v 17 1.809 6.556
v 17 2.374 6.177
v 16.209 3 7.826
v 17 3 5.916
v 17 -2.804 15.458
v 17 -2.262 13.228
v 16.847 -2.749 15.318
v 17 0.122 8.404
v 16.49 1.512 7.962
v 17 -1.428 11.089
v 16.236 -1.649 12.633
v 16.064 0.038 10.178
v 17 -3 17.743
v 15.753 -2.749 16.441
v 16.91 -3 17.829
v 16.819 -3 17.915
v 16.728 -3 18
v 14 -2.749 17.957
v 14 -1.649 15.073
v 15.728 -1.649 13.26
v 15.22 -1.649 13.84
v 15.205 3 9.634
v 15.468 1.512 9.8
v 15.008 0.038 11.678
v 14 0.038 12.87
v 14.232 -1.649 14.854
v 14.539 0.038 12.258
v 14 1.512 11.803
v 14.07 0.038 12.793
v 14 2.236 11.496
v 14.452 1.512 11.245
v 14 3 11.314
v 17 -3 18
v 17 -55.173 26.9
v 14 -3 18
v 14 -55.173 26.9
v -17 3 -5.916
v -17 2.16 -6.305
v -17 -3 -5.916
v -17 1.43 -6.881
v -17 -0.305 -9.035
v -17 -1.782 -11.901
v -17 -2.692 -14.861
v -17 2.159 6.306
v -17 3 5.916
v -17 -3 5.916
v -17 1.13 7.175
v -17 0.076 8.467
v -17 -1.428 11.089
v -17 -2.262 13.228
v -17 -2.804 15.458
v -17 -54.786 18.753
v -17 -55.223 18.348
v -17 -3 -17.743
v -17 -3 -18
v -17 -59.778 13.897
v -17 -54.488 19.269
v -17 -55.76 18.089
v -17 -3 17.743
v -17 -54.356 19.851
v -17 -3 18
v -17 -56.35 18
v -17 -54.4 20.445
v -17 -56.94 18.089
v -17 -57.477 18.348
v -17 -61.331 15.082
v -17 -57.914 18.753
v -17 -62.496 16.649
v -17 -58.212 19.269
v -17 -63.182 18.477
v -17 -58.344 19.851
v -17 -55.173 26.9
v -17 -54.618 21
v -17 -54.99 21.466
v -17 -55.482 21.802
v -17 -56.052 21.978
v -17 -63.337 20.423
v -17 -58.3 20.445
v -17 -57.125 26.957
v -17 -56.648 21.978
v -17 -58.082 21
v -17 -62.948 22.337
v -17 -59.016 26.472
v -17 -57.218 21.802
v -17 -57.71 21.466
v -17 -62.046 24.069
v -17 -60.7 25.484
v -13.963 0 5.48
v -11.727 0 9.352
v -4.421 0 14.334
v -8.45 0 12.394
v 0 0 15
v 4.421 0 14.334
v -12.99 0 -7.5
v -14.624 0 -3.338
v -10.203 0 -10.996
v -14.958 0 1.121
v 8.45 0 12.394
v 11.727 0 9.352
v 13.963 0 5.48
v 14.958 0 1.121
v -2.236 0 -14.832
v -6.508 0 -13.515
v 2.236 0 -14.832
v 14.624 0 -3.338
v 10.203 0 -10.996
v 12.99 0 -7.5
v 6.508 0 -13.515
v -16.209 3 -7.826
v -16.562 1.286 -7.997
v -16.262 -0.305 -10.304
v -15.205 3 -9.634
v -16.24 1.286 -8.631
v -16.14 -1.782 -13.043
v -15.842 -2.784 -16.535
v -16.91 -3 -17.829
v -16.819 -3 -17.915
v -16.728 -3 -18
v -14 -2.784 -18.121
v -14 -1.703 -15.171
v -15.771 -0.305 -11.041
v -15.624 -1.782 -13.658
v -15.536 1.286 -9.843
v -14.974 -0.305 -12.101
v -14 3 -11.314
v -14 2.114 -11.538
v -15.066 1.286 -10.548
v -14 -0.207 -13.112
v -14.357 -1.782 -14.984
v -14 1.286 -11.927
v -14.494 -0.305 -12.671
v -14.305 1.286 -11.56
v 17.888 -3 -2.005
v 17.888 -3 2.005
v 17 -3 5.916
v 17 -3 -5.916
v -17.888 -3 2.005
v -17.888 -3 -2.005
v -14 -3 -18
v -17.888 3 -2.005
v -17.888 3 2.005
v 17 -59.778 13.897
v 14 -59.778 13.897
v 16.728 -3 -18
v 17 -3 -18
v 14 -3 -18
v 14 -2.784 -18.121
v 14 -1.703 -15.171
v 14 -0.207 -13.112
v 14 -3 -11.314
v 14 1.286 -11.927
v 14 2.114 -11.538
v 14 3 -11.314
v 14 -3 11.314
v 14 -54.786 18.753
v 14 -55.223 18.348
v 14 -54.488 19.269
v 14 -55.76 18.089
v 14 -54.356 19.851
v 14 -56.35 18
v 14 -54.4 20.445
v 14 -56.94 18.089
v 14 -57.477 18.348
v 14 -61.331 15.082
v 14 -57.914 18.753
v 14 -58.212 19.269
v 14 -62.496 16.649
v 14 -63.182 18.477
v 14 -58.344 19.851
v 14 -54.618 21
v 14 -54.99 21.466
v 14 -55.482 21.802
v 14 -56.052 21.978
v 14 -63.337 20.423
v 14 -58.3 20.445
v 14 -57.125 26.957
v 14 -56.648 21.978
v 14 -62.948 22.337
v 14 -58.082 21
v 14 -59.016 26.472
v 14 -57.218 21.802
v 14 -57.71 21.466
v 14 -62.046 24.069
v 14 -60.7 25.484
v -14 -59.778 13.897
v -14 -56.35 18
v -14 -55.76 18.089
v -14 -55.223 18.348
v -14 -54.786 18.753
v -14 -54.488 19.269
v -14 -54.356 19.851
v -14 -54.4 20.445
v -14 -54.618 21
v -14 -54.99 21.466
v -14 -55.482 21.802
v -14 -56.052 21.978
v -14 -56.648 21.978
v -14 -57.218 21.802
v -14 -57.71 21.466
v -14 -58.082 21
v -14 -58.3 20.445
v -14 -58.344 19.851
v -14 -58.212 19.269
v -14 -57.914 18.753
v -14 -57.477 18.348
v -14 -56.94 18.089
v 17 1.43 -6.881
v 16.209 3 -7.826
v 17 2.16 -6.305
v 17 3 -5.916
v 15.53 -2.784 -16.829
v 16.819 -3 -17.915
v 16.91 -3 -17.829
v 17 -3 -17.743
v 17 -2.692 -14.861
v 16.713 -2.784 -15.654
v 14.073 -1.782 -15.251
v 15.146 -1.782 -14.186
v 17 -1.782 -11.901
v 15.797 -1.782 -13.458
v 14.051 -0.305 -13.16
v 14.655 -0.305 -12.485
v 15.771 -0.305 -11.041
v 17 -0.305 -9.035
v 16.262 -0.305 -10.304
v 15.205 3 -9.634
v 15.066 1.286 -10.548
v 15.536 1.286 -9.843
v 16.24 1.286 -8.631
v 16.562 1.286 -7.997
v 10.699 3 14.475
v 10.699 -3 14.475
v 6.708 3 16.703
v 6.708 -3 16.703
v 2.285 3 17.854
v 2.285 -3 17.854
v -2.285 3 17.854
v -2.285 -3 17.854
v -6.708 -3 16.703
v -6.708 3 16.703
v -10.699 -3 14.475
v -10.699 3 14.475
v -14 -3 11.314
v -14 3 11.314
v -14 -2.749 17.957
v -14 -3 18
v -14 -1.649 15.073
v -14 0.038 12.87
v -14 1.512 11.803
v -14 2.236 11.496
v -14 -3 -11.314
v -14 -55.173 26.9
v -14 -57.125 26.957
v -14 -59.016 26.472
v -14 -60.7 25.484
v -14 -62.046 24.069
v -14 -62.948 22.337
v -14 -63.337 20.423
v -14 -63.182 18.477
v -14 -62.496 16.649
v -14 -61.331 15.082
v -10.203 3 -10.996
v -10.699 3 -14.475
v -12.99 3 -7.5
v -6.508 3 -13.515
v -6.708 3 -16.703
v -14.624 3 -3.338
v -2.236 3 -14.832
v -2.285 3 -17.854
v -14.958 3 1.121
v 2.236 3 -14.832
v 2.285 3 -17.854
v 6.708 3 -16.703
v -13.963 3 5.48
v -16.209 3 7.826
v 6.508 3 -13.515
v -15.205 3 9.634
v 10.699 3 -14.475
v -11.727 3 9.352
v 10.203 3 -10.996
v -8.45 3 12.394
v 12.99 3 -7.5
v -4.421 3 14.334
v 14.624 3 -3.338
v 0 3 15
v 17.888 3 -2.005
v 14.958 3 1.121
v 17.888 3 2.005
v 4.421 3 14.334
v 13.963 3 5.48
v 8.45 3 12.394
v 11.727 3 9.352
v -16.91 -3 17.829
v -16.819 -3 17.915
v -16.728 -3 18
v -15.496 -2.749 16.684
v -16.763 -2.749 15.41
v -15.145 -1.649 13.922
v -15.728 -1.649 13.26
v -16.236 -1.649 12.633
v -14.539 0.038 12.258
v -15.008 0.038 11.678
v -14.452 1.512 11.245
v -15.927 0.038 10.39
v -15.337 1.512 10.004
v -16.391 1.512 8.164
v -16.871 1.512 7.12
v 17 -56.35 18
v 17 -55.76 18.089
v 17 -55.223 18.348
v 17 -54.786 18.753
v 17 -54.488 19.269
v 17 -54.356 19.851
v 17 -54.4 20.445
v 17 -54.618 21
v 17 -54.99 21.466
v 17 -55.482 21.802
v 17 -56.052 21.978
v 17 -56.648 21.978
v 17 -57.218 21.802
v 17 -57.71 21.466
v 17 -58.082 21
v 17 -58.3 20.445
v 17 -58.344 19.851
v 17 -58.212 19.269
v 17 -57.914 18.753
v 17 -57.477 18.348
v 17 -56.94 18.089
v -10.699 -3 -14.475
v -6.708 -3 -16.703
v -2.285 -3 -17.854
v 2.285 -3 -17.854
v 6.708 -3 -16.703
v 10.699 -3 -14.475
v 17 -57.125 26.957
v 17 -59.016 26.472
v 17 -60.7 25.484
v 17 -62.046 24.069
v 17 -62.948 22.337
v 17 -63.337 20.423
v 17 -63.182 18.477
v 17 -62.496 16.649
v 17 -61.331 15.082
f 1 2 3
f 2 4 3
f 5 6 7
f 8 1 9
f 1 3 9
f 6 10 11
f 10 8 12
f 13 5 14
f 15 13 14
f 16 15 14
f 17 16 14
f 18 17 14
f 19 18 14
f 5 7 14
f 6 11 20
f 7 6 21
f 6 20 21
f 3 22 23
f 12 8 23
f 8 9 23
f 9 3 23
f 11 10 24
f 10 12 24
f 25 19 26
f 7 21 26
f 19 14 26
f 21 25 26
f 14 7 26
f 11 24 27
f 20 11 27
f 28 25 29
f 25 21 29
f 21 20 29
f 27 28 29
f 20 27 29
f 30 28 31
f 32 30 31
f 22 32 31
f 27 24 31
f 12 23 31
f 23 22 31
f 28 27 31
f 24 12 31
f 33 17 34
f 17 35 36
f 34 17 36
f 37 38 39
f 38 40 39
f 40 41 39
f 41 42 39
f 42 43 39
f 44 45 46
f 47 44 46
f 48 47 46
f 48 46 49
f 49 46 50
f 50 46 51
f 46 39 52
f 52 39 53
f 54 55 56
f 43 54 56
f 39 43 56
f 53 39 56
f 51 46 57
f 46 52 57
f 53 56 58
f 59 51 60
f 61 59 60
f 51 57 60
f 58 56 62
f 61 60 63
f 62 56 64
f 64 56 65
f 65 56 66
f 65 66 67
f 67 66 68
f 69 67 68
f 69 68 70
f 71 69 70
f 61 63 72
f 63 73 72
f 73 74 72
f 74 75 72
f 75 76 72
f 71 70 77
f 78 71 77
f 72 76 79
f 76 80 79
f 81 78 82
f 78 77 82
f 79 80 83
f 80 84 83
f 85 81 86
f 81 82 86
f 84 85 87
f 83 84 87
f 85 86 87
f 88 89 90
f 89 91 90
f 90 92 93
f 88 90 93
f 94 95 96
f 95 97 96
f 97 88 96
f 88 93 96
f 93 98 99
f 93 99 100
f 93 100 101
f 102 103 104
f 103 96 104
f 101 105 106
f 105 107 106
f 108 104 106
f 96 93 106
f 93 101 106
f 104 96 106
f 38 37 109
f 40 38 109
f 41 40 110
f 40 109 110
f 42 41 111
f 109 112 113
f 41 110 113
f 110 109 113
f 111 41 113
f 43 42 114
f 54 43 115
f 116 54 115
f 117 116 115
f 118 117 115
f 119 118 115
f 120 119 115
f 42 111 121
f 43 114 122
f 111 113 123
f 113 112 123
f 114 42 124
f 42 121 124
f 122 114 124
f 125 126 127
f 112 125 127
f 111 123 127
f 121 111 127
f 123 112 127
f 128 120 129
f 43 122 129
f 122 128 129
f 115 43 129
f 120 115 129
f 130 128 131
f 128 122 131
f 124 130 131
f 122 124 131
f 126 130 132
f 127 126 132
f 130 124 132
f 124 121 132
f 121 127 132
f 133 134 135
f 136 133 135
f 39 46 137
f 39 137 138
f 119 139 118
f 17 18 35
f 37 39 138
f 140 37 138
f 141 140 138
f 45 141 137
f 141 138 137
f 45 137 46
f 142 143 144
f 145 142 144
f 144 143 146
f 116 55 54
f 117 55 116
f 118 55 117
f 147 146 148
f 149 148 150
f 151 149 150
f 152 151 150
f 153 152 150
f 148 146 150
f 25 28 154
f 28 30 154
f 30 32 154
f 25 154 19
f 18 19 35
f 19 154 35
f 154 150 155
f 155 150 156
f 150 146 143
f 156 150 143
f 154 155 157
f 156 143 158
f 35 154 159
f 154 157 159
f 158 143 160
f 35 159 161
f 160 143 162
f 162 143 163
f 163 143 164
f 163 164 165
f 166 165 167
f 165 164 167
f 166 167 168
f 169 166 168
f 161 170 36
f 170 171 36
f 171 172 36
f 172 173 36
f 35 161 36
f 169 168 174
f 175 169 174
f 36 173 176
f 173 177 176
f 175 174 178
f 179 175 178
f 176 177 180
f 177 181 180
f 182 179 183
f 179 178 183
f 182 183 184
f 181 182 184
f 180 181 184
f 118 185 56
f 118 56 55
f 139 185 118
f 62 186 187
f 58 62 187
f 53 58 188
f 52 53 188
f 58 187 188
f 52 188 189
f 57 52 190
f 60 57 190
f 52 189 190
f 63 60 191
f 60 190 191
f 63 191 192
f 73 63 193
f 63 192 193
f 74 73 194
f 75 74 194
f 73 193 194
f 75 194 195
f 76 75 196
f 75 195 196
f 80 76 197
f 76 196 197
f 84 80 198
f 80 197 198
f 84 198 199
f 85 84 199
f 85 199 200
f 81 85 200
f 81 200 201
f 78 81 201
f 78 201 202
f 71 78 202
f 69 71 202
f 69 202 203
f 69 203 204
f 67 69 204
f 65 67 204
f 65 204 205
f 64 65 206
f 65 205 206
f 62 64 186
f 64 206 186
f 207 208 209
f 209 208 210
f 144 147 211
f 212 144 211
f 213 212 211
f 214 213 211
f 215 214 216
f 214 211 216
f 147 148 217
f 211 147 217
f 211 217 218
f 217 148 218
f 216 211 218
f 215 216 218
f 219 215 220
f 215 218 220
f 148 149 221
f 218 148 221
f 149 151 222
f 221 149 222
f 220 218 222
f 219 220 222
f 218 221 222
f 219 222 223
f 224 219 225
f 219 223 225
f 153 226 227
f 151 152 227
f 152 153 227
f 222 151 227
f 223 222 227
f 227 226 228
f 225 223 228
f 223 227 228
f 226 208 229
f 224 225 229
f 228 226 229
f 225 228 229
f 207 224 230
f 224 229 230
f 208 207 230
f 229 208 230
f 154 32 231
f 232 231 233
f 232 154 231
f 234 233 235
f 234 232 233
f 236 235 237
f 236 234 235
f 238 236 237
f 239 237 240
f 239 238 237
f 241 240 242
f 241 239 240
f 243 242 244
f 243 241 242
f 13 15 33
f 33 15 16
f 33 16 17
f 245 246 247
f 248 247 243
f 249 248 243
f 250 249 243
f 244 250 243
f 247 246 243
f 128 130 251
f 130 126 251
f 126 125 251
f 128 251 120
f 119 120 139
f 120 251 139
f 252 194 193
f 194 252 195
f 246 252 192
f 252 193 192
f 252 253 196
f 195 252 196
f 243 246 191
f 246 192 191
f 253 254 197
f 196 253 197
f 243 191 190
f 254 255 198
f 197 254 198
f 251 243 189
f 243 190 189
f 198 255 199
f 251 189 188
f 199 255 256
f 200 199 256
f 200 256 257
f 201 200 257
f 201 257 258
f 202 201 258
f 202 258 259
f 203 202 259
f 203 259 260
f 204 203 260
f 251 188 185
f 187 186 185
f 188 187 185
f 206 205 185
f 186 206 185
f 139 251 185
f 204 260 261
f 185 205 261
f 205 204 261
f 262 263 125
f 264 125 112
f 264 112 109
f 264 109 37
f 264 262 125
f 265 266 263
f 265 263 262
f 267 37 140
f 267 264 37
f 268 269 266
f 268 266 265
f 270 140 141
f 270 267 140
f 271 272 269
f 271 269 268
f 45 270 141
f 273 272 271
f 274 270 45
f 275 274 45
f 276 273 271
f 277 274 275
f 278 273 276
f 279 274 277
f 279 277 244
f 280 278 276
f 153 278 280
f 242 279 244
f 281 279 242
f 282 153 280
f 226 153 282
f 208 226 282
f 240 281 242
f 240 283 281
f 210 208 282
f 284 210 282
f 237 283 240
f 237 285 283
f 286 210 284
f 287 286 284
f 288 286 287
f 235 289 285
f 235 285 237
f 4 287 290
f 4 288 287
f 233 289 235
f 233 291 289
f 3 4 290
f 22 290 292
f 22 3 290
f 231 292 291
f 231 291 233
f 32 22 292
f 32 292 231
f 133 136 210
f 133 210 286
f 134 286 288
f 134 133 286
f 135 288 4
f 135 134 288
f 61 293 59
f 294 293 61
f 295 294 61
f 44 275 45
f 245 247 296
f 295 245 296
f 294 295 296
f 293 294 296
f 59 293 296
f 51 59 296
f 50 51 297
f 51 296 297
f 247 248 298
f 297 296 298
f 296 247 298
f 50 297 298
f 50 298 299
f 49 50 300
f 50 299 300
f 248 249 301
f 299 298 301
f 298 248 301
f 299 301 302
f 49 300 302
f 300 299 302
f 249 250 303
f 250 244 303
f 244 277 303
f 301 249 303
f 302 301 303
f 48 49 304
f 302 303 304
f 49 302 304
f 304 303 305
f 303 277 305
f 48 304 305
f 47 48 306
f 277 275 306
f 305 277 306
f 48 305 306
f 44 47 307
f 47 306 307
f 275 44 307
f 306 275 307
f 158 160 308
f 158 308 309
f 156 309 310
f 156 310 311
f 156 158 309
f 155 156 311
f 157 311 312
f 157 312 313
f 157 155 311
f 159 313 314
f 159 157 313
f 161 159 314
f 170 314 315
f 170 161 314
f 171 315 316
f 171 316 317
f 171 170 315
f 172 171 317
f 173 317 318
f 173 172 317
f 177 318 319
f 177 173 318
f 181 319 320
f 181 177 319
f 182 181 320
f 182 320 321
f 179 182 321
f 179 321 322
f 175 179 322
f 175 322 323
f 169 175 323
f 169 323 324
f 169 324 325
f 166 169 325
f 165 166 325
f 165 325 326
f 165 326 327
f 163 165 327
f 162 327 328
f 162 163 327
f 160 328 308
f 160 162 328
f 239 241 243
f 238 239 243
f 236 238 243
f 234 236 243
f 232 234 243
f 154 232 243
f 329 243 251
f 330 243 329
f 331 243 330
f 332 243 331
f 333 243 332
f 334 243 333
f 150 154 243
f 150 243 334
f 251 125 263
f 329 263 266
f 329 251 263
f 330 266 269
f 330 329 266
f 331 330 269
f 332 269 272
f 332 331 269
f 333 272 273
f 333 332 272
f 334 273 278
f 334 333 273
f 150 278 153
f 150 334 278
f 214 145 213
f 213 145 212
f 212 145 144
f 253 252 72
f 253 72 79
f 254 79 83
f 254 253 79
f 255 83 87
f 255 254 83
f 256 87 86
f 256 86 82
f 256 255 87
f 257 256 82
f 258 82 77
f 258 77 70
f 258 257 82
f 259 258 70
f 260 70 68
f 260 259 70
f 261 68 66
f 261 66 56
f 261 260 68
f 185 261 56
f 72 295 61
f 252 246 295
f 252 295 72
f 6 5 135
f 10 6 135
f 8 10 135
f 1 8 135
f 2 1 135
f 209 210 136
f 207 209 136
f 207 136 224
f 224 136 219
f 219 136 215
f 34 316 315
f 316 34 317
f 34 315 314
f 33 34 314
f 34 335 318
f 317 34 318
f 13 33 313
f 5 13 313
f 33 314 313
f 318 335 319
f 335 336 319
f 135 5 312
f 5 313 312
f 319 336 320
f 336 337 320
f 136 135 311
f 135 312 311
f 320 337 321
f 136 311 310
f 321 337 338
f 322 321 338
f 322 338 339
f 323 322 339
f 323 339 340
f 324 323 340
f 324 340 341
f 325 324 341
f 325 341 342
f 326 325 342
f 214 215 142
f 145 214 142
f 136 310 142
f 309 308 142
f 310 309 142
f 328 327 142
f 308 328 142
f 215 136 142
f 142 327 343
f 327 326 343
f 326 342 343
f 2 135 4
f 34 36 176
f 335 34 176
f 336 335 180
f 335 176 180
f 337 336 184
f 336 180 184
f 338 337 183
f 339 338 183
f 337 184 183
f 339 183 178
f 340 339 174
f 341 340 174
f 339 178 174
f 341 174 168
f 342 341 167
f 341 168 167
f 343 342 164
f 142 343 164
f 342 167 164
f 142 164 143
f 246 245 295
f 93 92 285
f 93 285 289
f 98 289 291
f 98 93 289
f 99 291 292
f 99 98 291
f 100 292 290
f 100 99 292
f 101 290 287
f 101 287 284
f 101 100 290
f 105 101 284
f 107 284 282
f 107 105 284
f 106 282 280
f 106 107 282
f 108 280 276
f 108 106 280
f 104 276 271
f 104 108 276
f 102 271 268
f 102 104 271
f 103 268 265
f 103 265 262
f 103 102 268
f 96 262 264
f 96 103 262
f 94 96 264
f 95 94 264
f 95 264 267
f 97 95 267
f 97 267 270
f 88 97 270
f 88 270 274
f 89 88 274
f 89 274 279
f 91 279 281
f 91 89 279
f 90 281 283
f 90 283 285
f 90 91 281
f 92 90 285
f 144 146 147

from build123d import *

# Parameters (mm, degrees)
ESQUISSE1_R        = 18
ESQUISSE1_R_2      = 15
BOSS_EXTRU_1_DEPTH = 3
BOSS_EXTRU_3_START = 3
ESQUISSE3_R        = 18
BOSS_EXTRU_3_DEPTH = 3
BOSS_EXTRU_2_START = 14
ESQUISSE2_R        = 2
BOSS_EXTRU_2_DEPTH = 3
FILLET1_R          = 6.6


with BuildPart() as part:
    # Esquisse1 → Boss.-Extru.1 (new body)
    with BuildSketch(Plane(origin=(0, 0, 0), x_dir=(1, 0, 0), z_dir=(0, 1, 0))):
        with Locations(Location((0, 0, 0), (0, 0, 270))):
            Circle(ESQUISSE1_R)
        with Locations(Location((0, 0, 0), (0, 0, 270))):
            Circle(ESQUISSE1_R_2, mode=Mode.SUBTRACT)
    extrude(amount=BOSS_EXTRU_1_DEPTH)

    # Esquisse3 → Boss.-Extru.3 (add)
    with BuildSketch(Plane.XZ.offset(BOSS_EXTRU_3_START)):
        with Locations(Location((0, 0, 0), (0, 0, 270))):
            Circle(ESQUISSE3_R)
    extrude(amount=-BOSS_EXTRU_3_DEPTH)

    # Esquisse2 → Boss.-Extru.2 (add)
    with BuildSketch(Plane(origin=(0, 0, 0), x_dir=(0, 0, -1), z_dir=(1, 0, 0)).offset(BOSS_EXTRU_2_START)):
        with BuildLine():
            Line((-18, -3), (-26.900313921, -55.172856085))
            ThreePointArc((-26.900313921, -55.172856085), (-22.337080841, -62.94833715), (-13.89709797, -59.778496291))
            Line((-13.89709797, -59.778496291), (18, -3))
            Line((18, -3), (-18, -3))
        make_face()
        with Locations((-20, -56.35)):
            Circle(ESQUISSE2_R, mode=Mode.SUBTRACT)
    boss_extru_2 = extrude(amount=BOSS_EXTRU_2_DEPTH)

    # Symétrie1: Boss.-Extru.2 across plane
    add(boss_extru_2.mirror(Plane(origin=(0, 0, 0), x_dir=(0, 0, 1), z_dir=(1, 0, 0))))

    # Fillet1
    # the kernel refuses this fillet: 6.6 mm, written as the material it adds along each edge
    with BuildSketch(Plane(origin=(0, -3, 0), x_dir=(-0.8375611584299304, 0, 0.5463435786110358), z_dir=(0.5463435786110358, 0, 0.8375611584299304))) as fillet1_piece_1_section:
        with BuildLine():
            CenterArc((24.57267069, -6.6), FILLET1_R, 90, 84.78409143)
            Line((24.57267069, 0), (18, 0))
            Line((18, 0), (18, -6))
        make_face()
    fillet1_piece_1 = revolve(axis=Axis((0, -3, 0), (0, -1, 0)), revolution_arc=124.363631706, mode=Mode.PRIVATE)
    fillet1_piece_1 = split(fillet1_piece_1, bisect_by=Plane(origin=(-14, -3, 0), z_dir=(-1, 0, 0)), keep=Keep.TOP, mode=Mode.PRIVATE)
    fillet1_piece_1 = split(fillet1_piece_1, bisect_by=Plane(origin=(-17, -3, 0), z_dir=(1, 0, 0)), keep=Keep.TOP, mode=Mode.PRIVATE)
    fillet1_piece_1 = split(fillet1_piece_1, bisect_by=Plane(origin=(0, -10.686285419, -13.681988516), z_dir=(0, 0.4897851844267101, 0.871843147083289)), keep=Keep.TOP, mode=Mode.PRIVATE)
    add(fillet1_piece_1)
    with BuildSketch(Plane(origin=(0, -3, 0), x_dir=(0.021764364768608612, 0, 0.999763128158975), z_dir=(0.999763128158975, 0, -0.021764364768608612))) as fillet1_piece_2_section:
        with BuildLine():
            CenterArc((24.57267069, -6.6), FILLET1_R, 90, 84.78409143)
            Line((24.57267069, 0), (18, 0))
            Line((18, 0), (18, -6))
        make_face()
    fillet1_piece_2 = revolve(axis=Axis((0, -3, 0), (0, -1, 0)), revolution_arc=124.363631706, mode=Mode.PRIVATE)
    fillet1_piece_2 = split(fillet1_piece_2, bisect_by=Plane(origin=(-14, -3, 0), z_dir=(-1, 0, 0)), keep=Keep.TOP, mode=Mode.PRIVATE)
    fillet1_piece_2 = split(fillet1_piece_2, bisect_by=Plane(origin=(0, -0.016164781, 17.490979177), z_dir=(0, -0.1681634163647939, -0.9857591315308831)), keep=Keep.TOP, mode=Mode.PRIVATE)
    fillet1_piece_2 = split(fillet1_piece_2, bisect_by=Plane(origin=(-17, -3, 0), z_dir=(1, 0, 0)), keep=Keep.TOP, mode=Mode.PRIVATE)
    add(fillet1_piece_2)
    with BuildSketch(Plane(origin=(0, -3, 0), x_dir=(-0.021764364768691844, 0, -0.9997631281589732), z_dir=(-0.9997631281589732, 0, 0.021764364768691844))) as fillet1_piece_3_section:
        with BuildLine():
            CenterArc((24.57267069, -6.6), FILLET1_R, 90, 84.78409143)
            Line((24.57267069, 0), (18, 0))
            Line((18, 0), (18, -6))
        make_face()
    fillet1_piece_3 = revolve(axis=Axis((0, -3, 0), (0, -1, 0)), revolution_arc=124.363631706, mode=Mode.PRIVATE)
    fillet1_piece_3 = split(fillet1_piece_3, bisect_by=Plane(origin=(14, -3, 0), z_dir=(1, 0, 0)), keep=Keep.TOP, mode=Mode.PRIVATE)
    fillet1_piece_3 = split(fillet1_piece_3, bisect_by=Plane(origin=(17, -3, 0), z_dir=(-1, 0, 0)), keep=Keep.TOP, mode=Mode.PRIVATE)
    fillet1_piece_3 = split(fillet1_piece_3, bisect_by=Plane(origin=(0, -10.686285419, -13.681988516), z_dir=(0, 0.4897851844267101, 0.871843147083289)), keep=Keep.TOP, mode=Mode.PRIVATE)
    add(fillet1_piece_3)
    with BuildSketch(Plane(origin=(0, -3, 0), x_dir=(0.8375611584299263, 0, -0.5463435786110422), z_dir=(-0.5463435786110422, 0, -0.8375611584299263))) as fillet1_piece_4_section:
        with BuildLine():
            CenterArc((24.57267069, -6.6), FILLET1_R, 90, 84.78409143)
            Line((24.57267069, 0), (18, 0))
            Line((18, 0), (18, -6))
        make_face()
    fillet1_piece_4 = revolve(axis=Axis((0, -3, 0), (0, -1, 0)), revolution_arc=124.363631706, mode=Mode.PRIVATE)
    fillet1_piece_4 = split(fillet1_piece_4, bisect_by=Plane(origin=(14, -3, 0), z_dir=(1, 0, 0)), keep=Keep.TOP, mode=Mode.PRIVATE)
    fillet1_piece_4 = split(fillet1_piece_4, bisect_by=Plane(origin=(17, -3, 0), z_dir=(-1, 0, 0)), keep=Keep.TOP, mode=Mode.PRIVATE)
    fillet1_piece_4 = split(fillet1_piece_4, bisect_by=Plane(origin=(0, -0.016164781, 17.490979177), z_dir=(0, -0.1681634163647939, -0.9857591315308831)), keep=Keep.TOP, mode=Mode.PRIVATE)
    add(fillet1_piece_4)


solid = part.part
